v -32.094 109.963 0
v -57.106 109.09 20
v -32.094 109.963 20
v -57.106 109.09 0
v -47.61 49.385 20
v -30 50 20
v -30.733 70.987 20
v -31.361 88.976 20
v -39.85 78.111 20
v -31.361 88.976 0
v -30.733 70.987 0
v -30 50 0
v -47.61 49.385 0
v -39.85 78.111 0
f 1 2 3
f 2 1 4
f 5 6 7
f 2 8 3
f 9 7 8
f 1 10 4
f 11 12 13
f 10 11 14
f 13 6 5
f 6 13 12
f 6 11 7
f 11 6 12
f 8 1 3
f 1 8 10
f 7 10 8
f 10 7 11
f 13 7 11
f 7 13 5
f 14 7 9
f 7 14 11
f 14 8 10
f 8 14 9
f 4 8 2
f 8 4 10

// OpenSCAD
translate([-30,50,0])
scale([3,3,1])
rotate([0,0,+92]) {
    difference() {
        cube([20, 20, 20]);
        translate([7, 0, -1]) {
            rotate([0,0,50]) {
                cube([30, 30, 30]);
            }
        }
        translate([13, 0, -1]) {
            rotate([0,0,50]) {
                cube([30, 30, 30]);
            }
        }
    }
}
